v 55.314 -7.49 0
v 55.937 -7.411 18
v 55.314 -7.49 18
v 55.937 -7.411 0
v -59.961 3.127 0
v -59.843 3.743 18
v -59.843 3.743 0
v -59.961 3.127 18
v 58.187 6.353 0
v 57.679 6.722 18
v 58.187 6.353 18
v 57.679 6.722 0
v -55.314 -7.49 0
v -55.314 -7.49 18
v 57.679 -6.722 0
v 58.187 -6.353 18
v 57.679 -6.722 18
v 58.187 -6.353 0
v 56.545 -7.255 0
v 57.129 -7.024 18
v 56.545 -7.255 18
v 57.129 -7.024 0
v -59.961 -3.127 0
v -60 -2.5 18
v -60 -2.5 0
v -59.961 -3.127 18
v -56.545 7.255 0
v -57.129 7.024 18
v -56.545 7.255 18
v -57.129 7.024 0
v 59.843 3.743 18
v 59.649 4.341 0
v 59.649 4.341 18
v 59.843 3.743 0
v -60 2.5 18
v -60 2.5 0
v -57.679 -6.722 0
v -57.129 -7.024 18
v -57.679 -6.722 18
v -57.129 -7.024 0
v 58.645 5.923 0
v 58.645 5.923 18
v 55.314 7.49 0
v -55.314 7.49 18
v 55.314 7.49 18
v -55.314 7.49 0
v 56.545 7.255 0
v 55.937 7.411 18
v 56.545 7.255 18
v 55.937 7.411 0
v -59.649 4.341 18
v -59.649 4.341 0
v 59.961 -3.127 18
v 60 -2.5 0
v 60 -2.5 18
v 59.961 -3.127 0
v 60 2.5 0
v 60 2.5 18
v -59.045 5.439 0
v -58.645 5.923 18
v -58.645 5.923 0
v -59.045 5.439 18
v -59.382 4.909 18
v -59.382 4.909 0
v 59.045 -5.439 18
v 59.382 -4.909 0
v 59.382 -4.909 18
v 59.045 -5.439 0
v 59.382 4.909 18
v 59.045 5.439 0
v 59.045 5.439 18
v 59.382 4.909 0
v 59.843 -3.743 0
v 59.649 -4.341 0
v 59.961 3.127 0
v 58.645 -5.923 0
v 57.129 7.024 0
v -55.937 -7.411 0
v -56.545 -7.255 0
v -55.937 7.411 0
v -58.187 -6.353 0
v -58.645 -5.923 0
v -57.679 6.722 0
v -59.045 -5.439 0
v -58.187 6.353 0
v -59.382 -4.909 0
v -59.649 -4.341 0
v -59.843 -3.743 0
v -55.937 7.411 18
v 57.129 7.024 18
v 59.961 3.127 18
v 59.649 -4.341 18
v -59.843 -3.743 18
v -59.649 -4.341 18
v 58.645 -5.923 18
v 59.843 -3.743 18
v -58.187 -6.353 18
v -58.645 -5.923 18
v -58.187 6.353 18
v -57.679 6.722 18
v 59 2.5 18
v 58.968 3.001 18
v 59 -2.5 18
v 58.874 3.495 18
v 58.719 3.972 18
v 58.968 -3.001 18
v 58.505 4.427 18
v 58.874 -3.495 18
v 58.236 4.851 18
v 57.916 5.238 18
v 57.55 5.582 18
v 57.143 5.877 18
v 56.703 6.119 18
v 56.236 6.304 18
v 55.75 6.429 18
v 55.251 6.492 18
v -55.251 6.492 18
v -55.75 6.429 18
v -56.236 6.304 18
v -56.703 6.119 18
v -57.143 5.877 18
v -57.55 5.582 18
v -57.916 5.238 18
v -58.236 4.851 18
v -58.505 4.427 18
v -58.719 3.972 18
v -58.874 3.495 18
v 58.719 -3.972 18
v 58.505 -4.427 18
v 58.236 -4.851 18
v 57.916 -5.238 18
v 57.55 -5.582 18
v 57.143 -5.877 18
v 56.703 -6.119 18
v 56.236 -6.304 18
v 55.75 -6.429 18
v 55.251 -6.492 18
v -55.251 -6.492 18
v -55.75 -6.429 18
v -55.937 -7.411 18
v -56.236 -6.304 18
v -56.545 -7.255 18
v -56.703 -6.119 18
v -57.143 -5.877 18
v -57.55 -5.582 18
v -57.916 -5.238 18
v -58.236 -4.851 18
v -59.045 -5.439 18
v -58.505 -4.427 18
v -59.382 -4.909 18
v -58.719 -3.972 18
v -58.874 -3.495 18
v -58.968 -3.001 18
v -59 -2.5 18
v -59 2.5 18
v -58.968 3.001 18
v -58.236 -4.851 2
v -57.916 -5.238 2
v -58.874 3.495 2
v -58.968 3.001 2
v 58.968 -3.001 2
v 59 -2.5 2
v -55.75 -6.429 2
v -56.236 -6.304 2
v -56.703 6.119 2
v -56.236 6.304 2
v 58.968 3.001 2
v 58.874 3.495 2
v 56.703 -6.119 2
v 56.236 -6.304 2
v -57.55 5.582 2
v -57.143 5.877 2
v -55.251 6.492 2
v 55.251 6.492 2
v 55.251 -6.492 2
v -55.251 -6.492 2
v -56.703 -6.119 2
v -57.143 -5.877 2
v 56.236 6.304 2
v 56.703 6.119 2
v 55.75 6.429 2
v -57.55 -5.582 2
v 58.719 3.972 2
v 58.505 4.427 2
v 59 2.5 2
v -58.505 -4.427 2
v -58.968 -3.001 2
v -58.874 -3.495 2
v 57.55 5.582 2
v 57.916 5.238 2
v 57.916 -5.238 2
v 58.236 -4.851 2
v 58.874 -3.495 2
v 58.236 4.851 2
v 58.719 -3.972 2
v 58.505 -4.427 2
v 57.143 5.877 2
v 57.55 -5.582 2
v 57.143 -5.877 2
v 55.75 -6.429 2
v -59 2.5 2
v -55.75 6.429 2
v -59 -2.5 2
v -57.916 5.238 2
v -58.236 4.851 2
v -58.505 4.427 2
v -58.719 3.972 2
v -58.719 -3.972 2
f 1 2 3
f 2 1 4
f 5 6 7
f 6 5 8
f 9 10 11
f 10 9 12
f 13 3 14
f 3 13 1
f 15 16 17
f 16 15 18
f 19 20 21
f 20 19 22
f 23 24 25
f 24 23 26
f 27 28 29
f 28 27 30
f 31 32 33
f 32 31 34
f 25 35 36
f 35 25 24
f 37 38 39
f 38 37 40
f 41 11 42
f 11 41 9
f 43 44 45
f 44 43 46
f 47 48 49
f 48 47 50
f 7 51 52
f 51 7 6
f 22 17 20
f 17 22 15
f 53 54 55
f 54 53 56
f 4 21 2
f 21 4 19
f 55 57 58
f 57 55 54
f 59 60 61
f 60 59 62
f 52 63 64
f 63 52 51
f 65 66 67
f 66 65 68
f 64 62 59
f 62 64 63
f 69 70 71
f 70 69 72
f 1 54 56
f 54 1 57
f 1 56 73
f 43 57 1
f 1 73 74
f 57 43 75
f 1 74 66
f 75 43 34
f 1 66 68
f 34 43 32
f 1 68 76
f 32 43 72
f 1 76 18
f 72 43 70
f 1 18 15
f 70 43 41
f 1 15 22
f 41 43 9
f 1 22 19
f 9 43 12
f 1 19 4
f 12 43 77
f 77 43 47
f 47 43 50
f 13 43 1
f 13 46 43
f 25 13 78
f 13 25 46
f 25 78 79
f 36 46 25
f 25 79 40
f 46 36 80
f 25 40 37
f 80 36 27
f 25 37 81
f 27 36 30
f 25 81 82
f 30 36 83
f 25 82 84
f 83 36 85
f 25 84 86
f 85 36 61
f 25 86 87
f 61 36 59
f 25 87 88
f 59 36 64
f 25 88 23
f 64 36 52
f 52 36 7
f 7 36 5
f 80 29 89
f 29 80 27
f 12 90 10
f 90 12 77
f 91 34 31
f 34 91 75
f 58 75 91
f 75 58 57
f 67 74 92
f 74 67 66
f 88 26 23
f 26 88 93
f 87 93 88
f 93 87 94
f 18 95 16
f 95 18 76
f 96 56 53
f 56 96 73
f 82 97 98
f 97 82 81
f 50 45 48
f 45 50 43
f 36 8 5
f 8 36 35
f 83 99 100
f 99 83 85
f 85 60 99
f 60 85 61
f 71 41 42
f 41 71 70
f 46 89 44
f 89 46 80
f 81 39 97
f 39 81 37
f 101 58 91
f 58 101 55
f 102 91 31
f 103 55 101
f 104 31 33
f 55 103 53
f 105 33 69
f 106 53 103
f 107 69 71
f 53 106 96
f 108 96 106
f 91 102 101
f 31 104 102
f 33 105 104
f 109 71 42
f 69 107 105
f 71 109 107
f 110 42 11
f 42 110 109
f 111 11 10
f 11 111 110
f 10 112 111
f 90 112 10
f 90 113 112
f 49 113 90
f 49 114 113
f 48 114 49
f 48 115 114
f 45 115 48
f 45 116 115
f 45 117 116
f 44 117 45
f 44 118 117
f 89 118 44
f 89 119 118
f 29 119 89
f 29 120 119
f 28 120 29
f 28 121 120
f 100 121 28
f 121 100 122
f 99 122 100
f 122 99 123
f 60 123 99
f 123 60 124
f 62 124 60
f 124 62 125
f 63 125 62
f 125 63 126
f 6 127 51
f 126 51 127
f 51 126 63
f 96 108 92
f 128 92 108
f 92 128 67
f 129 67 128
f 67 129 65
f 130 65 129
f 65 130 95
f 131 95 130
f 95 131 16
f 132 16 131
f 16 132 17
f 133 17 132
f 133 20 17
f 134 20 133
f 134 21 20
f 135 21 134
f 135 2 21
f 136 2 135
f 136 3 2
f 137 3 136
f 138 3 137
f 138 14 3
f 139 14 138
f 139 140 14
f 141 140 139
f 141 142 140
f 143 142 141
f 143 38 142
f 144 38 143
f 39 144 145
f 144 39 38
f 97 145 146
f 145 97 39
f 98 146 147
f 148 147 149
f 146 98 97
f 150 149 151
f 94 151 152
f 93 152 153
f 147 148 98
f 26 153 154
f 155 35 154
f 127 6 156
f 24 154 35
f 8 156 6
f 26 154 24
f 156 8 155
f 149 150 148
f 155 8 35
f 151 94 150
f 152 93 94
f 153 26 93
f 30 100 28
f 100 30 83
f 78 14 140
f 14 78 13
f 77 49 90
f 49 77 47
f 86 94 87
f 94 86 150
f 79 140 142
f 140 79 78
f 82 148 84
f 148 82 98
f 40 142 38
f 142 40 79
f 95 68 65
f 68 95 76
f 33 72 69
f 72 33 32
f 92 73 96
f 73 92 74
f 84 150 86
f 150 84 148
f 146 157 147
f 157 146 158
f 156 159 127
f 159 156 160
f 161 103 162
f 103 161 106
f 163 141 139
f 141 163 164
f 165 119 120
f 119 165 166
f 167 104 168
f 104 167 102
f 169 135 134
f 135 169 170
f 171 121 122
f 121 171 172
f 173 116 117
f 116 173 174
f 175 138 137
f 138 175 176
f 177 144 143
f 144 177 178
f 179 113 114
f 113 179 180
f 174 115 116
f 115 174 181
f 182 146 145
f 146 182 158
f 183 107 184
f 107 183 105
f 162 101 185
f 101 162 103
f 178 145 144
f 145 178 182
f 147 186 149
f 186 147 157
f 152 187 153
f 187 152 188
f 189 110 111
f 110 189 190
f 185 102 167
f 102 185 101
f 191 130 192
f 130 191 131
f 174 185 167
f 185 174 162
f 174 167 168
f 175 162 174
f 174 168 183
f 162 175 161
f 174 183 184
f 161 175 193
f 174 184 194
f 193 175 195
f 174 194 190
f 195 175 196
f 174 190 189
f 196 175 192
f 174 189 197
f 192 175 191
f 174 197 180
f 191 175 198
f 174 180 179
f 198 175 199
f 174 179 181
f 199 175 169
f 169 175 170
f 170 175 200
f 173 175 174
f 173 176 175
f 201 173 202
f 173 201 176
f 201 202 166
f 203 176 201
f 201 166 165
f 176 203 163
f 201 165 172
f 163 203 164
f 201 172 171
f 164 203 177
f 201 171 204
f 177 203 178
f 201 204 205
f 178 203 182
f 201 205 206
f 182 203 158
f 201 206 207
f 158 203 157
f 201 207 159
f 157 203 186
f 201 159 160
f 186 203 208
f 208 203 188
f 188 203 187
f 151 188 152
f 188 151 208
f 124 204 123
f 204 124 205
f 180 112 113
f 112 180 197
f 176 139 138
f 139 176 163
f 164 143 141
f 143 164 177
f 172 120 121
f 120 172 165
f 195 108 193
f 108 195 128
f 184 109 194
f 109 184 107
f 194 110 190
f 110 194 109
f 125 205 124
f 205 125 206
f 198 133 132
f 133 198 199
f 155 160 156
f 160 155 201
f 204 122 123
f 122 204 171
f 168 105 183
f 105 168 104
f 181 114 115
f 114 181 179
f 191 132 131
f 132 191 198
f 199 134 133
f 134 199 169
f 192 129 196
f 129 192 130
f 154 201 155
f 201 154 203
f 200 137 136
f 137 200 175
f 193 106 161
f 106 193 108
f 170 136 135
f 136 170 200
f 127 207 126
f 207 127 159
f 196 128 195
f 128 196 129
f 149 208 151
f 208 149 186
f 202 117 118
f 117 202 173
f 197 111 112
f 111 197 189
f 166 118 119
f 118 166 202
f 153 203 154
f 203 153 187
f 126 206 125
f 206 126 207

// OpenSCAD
$fn = 50;


difference() {
	union() {
		hull() {
			translate(v = [-55.0000000000, 2.5000000000, 0]) {
				cylinder(h = 18, r = 5);
			}
			translate(v = [55.0000000000, 2.5000000000, 0]) {
				cylinder(h = 18, r = 5);
			}
			translate(v = [-55.0000000000, -2.5000000000, 0]) {
				cylinder(h = 18, r = 5);
			}
			translate(v = [55.0000000000, -2.5000000000, 0]) {
				cylinder(h = 18, r = 5);
			}
		}
	}
	union() {
		translate(v = [0, 0, 2]) {
			hull() {
				translate(v = [-55.0000000000, 2.5000000000, 0]) {
					cylinder(h = 16, r = 4);
				}
				translate(v = [55.0000000000, 2.5000000000, 0]) {
					cylinder(h = 16, r = 4);
				}
				translate(v = [-55.0000000000, -2.5000000000, 0]) {
					cylinder(h = 16, r = 4);
				}
				translate(v = [55.0000000000, -2.5000000000, 0]) {
					cylinder(h = 16, r = 4);
				}
			}
		}
	}
}
